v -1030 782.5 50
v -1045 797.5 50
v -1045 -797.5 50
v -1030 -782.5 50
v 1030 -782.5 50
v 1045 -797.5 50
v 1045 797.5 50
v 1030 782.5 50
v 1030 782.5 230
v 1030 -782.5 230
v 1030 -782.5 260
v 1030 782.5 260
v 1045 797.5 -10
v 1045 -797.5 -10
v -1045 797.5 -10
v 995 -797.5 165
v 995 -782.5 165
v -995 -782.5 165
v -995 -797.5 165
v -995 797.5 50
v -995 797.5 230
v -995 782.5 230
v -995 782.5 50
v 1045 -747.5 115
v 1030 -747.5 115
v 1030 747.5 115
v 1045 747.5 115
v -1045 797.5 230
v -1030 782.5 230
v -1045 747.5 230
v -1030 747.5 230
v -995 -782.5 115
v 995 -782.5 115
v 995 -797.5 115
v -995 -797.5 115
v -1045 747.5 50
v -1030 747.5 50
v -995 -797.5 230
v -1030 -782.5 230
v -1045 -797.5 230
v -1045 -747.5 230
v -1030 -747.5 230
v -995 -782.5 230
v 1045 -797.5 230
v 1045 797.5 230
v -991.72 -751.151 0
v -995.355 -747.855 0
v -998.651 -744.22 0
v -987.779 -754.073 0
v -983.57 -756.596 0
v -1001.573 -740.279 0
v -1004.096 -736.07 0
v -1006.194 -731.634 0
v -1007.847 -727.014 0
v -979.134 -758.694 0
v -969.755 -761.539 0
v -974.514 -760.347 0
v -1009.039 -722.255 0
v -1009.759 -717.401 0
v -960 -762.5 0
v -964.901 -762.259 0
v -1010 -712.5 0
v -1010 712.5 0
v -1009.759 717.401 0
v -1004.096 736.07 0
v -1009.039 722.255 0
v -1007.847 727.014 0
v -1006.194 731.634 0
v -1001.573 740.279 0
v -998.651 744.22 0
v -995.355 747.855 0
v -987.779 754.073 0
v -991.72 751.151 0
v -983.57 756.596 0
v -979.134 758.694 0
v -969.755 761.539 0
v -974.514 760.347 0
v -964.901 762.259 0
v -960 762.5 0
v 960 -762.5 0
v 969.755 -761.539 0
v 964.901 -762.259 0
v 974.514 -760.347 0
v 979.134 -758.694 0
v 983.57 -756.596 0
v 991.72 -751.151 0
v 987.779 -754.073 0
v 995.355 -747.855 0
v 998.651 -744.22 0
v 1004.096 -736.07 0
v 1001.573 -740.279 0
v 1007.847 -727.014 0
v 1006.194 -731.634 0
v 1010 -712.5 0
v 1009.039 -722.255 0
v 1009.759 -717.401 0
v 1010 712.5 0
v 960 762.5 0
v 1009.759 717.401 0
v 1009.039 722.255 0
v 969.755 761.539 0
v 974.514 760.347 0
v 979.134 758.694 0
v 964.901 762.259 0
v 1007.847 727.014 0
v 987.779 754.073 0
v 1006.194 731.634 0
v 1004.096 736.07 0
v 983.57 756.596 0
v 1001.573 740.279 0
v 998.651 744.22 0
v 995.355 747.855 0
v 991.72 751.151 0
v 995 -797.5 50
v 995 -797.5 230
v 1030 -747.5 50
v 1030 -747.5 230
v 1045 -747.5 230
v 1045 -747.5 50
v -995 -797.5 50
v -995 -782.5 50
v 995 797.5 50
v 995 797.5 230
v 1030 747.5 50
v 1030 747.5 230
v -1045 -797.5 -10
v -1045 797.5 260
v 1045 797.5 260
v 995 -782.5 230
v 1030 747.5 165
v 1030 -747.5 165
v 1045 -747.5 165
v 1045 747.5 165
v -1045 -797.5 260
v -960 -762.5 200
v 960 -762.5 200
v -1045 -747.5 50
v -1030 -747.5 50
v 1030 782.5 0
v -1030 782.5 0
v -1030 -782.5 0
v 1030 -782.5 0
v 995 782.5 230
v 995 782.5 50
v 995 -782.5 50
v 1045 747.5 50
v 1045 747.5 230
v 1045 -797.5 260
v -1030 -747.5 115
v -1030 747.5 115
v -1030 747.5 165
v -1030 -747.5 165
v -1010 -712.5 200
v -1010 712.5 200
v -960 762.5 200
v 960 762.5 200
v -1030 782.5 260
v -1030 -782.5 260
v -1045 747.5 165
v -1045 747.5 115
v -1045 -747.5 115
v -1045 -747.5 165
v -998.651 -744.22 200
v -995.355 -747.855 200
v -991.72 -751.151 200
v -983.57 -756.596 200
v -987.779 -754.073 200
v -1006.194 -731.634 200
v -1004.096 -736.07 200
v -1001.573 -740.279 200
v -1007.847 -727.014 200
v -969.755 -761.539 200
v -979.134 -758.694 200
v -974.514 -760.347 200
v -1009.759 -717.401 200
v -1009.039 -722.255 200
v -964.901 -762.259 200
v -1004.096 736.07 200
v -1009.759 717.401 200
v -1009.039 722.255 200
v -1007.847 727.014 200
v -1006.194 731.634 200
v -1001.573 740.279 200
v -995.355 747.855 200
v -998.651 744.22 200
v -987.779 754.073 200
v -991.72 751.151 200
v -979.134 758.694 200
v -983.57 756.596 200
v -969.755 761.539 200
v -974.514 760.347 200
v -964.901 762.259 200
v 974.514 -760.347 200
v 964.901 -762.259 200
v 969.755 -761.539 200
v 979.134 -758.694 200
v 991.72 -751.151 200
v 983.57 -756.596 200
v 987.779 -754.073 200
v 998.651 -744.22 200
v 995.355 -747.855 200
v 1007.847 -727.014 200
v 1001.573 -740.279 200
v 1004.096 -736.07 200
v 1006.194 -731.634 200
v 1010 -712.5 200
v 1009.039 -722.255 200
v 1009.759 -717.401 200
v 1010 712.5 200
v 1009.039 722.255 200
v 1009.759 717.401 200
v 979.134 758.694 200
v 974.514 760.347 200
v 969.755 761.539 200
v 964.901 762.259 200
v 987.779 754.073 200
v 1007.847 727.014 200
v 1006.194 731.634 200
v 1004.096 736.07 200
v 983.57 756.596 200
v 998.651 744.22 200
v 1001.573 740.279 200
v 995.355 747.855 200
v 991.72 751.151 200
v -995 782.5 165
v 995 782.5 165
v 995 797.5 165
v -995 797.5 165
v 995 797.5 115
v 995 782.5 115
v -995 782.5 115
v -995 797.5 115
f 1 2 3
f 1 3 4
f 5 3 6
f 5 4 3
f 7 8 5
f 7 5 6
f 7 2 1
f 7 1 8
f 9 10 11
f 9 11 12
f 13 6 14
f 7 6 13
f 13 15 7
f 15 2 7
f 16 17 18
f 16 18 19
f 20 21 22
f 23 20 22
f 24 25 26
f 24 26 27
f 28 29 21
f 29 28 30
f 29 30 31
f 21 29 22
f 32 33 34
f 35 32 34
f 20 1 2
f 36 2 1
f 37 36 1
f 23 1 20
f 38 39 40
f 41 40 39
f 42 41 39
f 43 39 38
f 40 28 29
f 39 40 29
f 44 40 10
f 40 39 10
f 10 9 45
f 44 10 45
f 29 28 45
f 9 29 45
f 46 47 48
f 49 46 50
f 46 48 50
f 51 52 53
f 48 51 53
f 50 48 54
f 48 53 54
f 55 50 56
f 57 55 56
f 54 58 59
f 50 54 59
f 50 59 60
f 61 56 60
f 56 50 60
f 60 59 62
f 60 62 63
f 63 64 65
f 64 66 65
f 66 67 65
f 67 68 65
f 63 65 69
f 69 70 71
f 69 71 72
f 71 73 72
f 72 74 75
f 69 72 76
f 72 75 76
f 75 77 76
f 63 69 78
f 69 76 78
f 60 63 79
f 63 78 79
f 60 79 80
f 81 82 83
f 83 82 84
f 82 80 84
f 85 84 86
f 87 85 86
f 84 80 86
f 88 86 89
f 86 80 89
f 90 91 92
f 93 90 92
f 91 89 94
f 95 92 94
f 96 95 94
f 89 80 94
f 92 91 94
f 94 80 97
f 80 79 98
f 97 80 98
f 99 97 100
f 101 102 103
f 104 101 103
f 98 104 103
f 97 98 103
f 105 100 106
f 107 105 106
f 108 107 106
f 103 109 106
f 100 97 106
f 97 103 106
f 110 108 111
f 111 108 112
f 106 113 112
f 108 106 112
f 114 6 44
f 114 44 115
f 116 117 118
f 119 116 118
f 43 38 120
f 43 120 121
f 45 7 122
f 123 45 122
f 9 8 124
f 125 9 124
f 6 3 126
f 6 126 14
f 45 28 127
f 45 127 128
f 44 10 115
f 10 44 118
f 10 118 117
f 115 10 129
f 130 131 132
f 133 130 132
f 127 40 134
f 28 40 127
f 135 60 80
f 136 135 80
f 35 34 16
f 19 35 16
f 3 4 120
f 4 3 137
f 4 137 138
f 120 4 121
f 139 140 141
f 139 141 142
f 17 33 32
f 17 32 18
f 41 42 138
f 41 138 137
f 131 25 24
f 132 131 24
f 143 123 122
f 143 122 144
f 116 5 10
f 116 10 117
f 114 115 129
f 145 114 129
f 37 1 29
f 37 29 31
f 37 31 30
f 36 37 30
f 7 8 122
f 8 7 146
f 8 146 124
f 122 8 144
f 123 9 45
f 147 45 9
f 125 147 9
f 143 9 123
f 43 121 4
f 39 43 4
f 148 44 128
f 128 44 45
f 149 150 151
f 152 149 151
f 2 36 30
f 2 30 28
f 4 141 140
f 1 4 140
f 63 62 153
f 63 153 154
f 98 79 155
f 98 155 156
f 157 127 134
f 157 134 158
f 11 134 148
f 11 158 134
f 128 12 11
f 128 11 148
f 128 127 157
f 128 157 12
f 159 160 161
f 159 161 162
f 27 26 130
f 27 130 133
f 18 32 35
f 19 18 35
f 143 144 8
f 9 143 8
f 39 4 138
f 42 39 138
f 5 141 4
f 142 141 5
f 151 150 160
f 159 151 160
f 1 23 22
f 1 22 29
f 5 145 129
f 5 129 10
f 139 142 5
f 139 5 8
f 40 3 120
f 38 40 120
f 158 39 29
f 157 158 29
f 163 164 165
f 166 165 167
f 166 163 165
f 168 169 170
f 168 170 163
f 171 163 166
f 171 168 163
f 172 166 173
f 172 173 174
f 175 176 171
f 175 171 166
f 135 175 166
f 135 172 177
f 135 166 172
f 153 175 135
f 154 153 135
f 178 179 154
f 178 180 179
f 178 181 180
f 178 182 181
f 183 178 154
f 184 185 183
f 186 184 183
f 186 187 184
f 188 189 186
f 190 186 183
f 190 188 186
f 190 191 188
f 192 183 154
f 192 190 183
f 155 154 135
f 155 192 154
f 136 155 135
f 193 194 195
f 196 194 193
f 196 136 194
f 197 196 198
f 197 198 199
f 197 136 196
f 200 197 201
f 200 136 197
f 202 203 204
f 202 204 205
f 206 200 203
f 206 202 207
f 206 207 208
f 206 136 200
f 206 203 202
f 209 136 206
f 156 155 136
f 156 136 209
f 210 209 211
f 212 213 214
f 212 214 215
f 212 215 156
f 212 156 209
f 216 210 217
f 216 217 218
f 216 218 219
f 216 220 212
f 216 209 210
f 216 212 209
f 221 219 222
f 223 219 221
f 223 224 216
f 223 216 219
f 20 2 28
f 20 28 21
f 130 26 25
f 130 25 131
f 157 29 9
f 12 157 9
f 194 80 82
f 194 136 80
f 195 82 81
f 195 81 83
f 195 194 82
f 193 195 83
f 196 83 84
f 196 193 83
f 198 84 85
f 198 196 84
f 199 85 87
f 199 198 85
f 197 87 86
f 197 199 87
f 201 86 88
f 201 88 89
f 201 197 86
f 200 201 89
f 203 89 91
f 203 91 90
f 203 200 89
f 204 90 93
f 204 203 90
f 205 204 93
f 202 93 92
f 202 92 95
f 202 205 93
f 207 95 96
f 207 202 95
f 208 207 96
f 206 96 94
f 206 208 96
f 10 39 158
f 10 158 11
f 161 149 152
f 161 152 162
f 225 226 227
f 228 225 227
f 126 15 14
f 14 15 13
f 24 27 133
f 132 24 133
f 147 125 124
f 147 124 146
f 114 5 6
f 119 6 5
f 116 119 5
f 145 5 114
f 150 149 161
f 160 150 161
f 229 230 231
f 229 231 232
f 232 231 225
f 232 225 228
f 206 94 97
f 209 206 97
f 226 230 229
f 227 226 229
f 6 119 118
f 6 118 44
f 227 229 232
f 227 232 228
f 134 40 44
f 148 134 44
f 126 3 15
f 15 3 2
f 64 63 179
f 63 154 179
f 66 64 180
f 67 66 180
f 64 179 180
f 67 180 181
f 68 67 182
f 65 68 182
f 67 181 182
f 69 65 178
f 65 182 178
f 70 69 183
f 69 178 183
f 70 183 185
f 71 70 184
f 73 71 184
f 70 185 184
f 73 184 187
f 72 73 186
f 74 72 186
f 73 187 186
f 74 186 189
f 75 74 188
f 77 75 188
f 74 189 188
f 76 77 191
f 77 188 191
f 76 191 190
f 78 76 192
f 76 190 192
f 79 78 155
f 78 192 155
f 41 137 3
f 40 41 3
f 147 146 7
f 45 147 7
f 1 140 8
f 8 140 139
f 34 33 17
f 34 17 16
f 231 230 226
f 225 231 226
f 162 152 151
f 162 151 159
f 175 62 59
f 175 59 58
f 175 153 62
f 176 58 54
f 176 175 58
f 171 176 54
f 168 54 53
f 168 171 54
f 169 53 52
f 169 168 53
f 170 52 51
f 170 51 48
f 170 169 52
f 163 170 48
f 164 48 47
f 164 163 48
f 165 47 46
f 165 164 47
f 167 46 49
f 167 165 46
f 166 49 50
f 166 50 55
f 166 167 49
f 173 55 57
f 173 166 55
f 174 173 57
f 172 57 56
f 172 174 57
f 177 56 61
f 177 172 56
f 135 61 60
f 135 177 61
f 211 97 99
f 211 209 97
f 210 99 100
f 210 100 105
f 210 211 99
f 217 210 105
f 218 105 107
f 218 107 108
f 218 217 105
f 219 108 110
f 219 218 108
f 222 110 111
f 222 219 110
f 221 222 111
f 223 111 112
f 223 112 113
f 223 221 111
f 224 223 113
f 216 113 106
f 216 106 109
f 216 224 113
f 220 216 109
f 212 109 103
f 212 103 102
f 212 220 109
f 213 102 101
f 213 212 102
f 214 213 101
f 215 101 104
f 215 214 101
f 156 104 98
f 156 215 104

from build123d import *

# Parameters (mm, degrees)
F0_W      = 2020
F0_H      = 1525
F1_DEPTH  = 200
F2_R      = 50
F4_W      = 2090
F4_H      = 1595
F4_W_2    = 2060
F4_H_2    = 1565
F5_DEPTH  = 50
F6_W      = 2090
F6_H      = 1595
F7_DEPTH  = 10
F9_W      = 2090
F9_H      = 1595
F9_W_2    = 2060
F9_H_2    = 1565
F10_DEPTH = 30
F13_DEPTH = 180
F16_W     = 15
F16_H     = 50
F17_DEPTH = 1990
F18_W     = 15
F18_H     = 50
F19_DEPTH = 1495


with BuildPart() as f1:
    # F0 (on Top) → F1 (new body)
    with BuildSketch(Plane.XY):
        Rectangle(F0_W, F0_H)
    extrude(amount=F1_DEPTH)

    # F2
    f2_edges = [f1.edges().sort_by_distance(p)[0] for p in [
        (1010, -762.5, 100),
        (-1010, -762.5, 100),
        (-1010, 762.5, 100),
        (1010, 762.5, 100),
    ]]
    fillet(f2_edges, radius=F2_R)


with BuildPart() as f5:
    # F4 (on face) → F5 (new body)
    with BuildSketch(Plane.XY):
        Rectangle(F4_W, F4_H)
        Rectangle(F4_W_2, F4_H_2, mode=Mode.SUBTRACT)
    extrude(amount=F5_DEPTH)

    # F6 (on Top) → F7 (join)
    with BuildSketch(Plane.XY):
        Rectangle(F6_W, F6_H)
    extrude(amount=-F7_DEPTH)


with BuildPart() as f10:
    # F9 (on offset) → F10 (new body)
    with BuildSketch(Plane.XY.offset(230)):
        Rectangle(F9_W, F9_H)
        Rectangle(F9_W_2, F9_H_2, mode=Mode.SUBTRACT)
    extrude(amount=F10_DEPTH)


with BuildPart() as f13:
    # F12 (on offset) → F13 (new body)
    with BuildSketch(Plane.XY.offset(50)):
        Polygon((-1030, -747.5), (-1045, -747.5), (-1045, -797.5), (-995, -797.5), (-995, -782.5), (-1030, -782.5), align=None)
    extrude(amount=F13_DEPTH)


with BuildPart() as f14_1:
    # F14: instance of F13
    add(f13.part.mirror(Plane.XZ))


with BuildPart() as f15_1:
    # F15: instance of F13
    add(f13.part.mirror(Plane.YZ))


with BuildPart() as f15_2:
    # F15: instance of F14_1
    add(f14_1.part.mirror(Plane.YZ))


with BuildPart() as f17:
    # F16 (on face) → F17 (new body)
    with BuildSketch(Plane(origin=(995, 0, 0), x_dir=(0, -1, 0), z_dir=(-1, 0, 0))):
        with Locations((790, 140)):
            Rectangle(F16_W, F16_H)
    extrude(amount=F17_DEPTH)


with BuildPart() as f19:
    # F18 (on face) → F19 (new body)
    with BuildSketch(Plane(origin=(0, -747.5, 0), x_dir=(-1, 0, 0), z_dir=(0, 1, 0))):
        with Locations((1037.5, 140)):
            Rectangle(F18_W, F18_H)
    extrude(amount=F19_DEPTH)


with BuildPart() as f20_1:
    # F20: instance of F19
    add(f19.part.mirror(Plane.YZ))


with BuildPart() as f21_1:
    # F21: instance of F17
    add(f17.part.mirror(Plane.XZ))


solid = Compound([f1.part, f5.part, f10.part, f13.part, f14_1.part, f15_1.part, f15_2.part, f17.part, f19.part, f20_1.part, f21_1.part])
